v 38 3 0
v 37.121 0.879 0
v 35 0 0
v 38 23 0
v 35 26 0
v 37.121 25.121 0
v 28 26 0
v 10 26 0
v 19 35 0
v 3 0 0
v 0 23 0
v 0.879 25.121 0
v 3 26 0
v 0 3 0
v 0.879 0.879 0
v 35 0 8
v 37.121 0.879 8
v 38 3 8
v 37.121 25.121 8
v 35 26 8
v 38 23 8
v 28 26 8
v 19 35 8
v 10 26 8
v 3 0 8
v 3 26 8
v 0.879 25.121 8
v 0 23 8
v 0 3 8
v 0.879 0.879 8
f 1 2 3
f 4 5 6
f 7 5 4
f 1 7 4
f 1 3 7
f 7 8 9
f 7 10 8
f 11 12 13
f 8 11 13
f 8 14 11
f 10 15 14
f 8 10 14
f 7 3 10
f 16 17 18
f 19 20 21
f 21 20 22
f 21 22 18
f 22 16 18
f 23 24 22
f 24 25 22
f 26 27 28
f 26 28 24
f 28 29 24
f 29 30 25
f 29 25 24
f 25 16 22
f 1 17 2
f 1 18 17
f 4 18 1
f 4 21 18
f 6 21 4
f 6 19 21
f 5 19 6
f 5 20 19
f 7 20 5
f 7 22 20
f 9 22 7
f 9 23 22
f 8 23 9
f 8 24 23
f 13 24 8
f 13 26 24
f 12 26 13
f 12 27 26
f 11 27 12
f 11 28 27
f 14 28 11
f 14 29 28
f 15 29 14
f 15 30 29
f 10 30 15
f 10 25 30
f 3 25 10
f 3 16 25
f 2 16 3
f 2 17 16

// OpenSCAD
$fn = 32;

// ----------------------------------------------------------------------
// Ratchet pawl: 38 x 26 mm body, beak 9 mm сверху
// ----------------------------------------------------------------------

// --- parameters (mm) ---
profile_height = 8;       // extrusion height
profile_points = 15;      // points of the closed outline

profile = [[0, 3], [0.879, 0.879], [3, 0], [35, 0], [37.121, 0.879], [38, 3], [38, 23], [37.121, 25.121], [35, 26], [28, 26], [19, 35], [10, 26], [3, 26], [0.879, 25.121], [0, 23]];  // single closed polygon, 15 points, counter clockwise

// --- the one profile operation ---
linear_extrude(height = profile_height) polygon(points = profile);
